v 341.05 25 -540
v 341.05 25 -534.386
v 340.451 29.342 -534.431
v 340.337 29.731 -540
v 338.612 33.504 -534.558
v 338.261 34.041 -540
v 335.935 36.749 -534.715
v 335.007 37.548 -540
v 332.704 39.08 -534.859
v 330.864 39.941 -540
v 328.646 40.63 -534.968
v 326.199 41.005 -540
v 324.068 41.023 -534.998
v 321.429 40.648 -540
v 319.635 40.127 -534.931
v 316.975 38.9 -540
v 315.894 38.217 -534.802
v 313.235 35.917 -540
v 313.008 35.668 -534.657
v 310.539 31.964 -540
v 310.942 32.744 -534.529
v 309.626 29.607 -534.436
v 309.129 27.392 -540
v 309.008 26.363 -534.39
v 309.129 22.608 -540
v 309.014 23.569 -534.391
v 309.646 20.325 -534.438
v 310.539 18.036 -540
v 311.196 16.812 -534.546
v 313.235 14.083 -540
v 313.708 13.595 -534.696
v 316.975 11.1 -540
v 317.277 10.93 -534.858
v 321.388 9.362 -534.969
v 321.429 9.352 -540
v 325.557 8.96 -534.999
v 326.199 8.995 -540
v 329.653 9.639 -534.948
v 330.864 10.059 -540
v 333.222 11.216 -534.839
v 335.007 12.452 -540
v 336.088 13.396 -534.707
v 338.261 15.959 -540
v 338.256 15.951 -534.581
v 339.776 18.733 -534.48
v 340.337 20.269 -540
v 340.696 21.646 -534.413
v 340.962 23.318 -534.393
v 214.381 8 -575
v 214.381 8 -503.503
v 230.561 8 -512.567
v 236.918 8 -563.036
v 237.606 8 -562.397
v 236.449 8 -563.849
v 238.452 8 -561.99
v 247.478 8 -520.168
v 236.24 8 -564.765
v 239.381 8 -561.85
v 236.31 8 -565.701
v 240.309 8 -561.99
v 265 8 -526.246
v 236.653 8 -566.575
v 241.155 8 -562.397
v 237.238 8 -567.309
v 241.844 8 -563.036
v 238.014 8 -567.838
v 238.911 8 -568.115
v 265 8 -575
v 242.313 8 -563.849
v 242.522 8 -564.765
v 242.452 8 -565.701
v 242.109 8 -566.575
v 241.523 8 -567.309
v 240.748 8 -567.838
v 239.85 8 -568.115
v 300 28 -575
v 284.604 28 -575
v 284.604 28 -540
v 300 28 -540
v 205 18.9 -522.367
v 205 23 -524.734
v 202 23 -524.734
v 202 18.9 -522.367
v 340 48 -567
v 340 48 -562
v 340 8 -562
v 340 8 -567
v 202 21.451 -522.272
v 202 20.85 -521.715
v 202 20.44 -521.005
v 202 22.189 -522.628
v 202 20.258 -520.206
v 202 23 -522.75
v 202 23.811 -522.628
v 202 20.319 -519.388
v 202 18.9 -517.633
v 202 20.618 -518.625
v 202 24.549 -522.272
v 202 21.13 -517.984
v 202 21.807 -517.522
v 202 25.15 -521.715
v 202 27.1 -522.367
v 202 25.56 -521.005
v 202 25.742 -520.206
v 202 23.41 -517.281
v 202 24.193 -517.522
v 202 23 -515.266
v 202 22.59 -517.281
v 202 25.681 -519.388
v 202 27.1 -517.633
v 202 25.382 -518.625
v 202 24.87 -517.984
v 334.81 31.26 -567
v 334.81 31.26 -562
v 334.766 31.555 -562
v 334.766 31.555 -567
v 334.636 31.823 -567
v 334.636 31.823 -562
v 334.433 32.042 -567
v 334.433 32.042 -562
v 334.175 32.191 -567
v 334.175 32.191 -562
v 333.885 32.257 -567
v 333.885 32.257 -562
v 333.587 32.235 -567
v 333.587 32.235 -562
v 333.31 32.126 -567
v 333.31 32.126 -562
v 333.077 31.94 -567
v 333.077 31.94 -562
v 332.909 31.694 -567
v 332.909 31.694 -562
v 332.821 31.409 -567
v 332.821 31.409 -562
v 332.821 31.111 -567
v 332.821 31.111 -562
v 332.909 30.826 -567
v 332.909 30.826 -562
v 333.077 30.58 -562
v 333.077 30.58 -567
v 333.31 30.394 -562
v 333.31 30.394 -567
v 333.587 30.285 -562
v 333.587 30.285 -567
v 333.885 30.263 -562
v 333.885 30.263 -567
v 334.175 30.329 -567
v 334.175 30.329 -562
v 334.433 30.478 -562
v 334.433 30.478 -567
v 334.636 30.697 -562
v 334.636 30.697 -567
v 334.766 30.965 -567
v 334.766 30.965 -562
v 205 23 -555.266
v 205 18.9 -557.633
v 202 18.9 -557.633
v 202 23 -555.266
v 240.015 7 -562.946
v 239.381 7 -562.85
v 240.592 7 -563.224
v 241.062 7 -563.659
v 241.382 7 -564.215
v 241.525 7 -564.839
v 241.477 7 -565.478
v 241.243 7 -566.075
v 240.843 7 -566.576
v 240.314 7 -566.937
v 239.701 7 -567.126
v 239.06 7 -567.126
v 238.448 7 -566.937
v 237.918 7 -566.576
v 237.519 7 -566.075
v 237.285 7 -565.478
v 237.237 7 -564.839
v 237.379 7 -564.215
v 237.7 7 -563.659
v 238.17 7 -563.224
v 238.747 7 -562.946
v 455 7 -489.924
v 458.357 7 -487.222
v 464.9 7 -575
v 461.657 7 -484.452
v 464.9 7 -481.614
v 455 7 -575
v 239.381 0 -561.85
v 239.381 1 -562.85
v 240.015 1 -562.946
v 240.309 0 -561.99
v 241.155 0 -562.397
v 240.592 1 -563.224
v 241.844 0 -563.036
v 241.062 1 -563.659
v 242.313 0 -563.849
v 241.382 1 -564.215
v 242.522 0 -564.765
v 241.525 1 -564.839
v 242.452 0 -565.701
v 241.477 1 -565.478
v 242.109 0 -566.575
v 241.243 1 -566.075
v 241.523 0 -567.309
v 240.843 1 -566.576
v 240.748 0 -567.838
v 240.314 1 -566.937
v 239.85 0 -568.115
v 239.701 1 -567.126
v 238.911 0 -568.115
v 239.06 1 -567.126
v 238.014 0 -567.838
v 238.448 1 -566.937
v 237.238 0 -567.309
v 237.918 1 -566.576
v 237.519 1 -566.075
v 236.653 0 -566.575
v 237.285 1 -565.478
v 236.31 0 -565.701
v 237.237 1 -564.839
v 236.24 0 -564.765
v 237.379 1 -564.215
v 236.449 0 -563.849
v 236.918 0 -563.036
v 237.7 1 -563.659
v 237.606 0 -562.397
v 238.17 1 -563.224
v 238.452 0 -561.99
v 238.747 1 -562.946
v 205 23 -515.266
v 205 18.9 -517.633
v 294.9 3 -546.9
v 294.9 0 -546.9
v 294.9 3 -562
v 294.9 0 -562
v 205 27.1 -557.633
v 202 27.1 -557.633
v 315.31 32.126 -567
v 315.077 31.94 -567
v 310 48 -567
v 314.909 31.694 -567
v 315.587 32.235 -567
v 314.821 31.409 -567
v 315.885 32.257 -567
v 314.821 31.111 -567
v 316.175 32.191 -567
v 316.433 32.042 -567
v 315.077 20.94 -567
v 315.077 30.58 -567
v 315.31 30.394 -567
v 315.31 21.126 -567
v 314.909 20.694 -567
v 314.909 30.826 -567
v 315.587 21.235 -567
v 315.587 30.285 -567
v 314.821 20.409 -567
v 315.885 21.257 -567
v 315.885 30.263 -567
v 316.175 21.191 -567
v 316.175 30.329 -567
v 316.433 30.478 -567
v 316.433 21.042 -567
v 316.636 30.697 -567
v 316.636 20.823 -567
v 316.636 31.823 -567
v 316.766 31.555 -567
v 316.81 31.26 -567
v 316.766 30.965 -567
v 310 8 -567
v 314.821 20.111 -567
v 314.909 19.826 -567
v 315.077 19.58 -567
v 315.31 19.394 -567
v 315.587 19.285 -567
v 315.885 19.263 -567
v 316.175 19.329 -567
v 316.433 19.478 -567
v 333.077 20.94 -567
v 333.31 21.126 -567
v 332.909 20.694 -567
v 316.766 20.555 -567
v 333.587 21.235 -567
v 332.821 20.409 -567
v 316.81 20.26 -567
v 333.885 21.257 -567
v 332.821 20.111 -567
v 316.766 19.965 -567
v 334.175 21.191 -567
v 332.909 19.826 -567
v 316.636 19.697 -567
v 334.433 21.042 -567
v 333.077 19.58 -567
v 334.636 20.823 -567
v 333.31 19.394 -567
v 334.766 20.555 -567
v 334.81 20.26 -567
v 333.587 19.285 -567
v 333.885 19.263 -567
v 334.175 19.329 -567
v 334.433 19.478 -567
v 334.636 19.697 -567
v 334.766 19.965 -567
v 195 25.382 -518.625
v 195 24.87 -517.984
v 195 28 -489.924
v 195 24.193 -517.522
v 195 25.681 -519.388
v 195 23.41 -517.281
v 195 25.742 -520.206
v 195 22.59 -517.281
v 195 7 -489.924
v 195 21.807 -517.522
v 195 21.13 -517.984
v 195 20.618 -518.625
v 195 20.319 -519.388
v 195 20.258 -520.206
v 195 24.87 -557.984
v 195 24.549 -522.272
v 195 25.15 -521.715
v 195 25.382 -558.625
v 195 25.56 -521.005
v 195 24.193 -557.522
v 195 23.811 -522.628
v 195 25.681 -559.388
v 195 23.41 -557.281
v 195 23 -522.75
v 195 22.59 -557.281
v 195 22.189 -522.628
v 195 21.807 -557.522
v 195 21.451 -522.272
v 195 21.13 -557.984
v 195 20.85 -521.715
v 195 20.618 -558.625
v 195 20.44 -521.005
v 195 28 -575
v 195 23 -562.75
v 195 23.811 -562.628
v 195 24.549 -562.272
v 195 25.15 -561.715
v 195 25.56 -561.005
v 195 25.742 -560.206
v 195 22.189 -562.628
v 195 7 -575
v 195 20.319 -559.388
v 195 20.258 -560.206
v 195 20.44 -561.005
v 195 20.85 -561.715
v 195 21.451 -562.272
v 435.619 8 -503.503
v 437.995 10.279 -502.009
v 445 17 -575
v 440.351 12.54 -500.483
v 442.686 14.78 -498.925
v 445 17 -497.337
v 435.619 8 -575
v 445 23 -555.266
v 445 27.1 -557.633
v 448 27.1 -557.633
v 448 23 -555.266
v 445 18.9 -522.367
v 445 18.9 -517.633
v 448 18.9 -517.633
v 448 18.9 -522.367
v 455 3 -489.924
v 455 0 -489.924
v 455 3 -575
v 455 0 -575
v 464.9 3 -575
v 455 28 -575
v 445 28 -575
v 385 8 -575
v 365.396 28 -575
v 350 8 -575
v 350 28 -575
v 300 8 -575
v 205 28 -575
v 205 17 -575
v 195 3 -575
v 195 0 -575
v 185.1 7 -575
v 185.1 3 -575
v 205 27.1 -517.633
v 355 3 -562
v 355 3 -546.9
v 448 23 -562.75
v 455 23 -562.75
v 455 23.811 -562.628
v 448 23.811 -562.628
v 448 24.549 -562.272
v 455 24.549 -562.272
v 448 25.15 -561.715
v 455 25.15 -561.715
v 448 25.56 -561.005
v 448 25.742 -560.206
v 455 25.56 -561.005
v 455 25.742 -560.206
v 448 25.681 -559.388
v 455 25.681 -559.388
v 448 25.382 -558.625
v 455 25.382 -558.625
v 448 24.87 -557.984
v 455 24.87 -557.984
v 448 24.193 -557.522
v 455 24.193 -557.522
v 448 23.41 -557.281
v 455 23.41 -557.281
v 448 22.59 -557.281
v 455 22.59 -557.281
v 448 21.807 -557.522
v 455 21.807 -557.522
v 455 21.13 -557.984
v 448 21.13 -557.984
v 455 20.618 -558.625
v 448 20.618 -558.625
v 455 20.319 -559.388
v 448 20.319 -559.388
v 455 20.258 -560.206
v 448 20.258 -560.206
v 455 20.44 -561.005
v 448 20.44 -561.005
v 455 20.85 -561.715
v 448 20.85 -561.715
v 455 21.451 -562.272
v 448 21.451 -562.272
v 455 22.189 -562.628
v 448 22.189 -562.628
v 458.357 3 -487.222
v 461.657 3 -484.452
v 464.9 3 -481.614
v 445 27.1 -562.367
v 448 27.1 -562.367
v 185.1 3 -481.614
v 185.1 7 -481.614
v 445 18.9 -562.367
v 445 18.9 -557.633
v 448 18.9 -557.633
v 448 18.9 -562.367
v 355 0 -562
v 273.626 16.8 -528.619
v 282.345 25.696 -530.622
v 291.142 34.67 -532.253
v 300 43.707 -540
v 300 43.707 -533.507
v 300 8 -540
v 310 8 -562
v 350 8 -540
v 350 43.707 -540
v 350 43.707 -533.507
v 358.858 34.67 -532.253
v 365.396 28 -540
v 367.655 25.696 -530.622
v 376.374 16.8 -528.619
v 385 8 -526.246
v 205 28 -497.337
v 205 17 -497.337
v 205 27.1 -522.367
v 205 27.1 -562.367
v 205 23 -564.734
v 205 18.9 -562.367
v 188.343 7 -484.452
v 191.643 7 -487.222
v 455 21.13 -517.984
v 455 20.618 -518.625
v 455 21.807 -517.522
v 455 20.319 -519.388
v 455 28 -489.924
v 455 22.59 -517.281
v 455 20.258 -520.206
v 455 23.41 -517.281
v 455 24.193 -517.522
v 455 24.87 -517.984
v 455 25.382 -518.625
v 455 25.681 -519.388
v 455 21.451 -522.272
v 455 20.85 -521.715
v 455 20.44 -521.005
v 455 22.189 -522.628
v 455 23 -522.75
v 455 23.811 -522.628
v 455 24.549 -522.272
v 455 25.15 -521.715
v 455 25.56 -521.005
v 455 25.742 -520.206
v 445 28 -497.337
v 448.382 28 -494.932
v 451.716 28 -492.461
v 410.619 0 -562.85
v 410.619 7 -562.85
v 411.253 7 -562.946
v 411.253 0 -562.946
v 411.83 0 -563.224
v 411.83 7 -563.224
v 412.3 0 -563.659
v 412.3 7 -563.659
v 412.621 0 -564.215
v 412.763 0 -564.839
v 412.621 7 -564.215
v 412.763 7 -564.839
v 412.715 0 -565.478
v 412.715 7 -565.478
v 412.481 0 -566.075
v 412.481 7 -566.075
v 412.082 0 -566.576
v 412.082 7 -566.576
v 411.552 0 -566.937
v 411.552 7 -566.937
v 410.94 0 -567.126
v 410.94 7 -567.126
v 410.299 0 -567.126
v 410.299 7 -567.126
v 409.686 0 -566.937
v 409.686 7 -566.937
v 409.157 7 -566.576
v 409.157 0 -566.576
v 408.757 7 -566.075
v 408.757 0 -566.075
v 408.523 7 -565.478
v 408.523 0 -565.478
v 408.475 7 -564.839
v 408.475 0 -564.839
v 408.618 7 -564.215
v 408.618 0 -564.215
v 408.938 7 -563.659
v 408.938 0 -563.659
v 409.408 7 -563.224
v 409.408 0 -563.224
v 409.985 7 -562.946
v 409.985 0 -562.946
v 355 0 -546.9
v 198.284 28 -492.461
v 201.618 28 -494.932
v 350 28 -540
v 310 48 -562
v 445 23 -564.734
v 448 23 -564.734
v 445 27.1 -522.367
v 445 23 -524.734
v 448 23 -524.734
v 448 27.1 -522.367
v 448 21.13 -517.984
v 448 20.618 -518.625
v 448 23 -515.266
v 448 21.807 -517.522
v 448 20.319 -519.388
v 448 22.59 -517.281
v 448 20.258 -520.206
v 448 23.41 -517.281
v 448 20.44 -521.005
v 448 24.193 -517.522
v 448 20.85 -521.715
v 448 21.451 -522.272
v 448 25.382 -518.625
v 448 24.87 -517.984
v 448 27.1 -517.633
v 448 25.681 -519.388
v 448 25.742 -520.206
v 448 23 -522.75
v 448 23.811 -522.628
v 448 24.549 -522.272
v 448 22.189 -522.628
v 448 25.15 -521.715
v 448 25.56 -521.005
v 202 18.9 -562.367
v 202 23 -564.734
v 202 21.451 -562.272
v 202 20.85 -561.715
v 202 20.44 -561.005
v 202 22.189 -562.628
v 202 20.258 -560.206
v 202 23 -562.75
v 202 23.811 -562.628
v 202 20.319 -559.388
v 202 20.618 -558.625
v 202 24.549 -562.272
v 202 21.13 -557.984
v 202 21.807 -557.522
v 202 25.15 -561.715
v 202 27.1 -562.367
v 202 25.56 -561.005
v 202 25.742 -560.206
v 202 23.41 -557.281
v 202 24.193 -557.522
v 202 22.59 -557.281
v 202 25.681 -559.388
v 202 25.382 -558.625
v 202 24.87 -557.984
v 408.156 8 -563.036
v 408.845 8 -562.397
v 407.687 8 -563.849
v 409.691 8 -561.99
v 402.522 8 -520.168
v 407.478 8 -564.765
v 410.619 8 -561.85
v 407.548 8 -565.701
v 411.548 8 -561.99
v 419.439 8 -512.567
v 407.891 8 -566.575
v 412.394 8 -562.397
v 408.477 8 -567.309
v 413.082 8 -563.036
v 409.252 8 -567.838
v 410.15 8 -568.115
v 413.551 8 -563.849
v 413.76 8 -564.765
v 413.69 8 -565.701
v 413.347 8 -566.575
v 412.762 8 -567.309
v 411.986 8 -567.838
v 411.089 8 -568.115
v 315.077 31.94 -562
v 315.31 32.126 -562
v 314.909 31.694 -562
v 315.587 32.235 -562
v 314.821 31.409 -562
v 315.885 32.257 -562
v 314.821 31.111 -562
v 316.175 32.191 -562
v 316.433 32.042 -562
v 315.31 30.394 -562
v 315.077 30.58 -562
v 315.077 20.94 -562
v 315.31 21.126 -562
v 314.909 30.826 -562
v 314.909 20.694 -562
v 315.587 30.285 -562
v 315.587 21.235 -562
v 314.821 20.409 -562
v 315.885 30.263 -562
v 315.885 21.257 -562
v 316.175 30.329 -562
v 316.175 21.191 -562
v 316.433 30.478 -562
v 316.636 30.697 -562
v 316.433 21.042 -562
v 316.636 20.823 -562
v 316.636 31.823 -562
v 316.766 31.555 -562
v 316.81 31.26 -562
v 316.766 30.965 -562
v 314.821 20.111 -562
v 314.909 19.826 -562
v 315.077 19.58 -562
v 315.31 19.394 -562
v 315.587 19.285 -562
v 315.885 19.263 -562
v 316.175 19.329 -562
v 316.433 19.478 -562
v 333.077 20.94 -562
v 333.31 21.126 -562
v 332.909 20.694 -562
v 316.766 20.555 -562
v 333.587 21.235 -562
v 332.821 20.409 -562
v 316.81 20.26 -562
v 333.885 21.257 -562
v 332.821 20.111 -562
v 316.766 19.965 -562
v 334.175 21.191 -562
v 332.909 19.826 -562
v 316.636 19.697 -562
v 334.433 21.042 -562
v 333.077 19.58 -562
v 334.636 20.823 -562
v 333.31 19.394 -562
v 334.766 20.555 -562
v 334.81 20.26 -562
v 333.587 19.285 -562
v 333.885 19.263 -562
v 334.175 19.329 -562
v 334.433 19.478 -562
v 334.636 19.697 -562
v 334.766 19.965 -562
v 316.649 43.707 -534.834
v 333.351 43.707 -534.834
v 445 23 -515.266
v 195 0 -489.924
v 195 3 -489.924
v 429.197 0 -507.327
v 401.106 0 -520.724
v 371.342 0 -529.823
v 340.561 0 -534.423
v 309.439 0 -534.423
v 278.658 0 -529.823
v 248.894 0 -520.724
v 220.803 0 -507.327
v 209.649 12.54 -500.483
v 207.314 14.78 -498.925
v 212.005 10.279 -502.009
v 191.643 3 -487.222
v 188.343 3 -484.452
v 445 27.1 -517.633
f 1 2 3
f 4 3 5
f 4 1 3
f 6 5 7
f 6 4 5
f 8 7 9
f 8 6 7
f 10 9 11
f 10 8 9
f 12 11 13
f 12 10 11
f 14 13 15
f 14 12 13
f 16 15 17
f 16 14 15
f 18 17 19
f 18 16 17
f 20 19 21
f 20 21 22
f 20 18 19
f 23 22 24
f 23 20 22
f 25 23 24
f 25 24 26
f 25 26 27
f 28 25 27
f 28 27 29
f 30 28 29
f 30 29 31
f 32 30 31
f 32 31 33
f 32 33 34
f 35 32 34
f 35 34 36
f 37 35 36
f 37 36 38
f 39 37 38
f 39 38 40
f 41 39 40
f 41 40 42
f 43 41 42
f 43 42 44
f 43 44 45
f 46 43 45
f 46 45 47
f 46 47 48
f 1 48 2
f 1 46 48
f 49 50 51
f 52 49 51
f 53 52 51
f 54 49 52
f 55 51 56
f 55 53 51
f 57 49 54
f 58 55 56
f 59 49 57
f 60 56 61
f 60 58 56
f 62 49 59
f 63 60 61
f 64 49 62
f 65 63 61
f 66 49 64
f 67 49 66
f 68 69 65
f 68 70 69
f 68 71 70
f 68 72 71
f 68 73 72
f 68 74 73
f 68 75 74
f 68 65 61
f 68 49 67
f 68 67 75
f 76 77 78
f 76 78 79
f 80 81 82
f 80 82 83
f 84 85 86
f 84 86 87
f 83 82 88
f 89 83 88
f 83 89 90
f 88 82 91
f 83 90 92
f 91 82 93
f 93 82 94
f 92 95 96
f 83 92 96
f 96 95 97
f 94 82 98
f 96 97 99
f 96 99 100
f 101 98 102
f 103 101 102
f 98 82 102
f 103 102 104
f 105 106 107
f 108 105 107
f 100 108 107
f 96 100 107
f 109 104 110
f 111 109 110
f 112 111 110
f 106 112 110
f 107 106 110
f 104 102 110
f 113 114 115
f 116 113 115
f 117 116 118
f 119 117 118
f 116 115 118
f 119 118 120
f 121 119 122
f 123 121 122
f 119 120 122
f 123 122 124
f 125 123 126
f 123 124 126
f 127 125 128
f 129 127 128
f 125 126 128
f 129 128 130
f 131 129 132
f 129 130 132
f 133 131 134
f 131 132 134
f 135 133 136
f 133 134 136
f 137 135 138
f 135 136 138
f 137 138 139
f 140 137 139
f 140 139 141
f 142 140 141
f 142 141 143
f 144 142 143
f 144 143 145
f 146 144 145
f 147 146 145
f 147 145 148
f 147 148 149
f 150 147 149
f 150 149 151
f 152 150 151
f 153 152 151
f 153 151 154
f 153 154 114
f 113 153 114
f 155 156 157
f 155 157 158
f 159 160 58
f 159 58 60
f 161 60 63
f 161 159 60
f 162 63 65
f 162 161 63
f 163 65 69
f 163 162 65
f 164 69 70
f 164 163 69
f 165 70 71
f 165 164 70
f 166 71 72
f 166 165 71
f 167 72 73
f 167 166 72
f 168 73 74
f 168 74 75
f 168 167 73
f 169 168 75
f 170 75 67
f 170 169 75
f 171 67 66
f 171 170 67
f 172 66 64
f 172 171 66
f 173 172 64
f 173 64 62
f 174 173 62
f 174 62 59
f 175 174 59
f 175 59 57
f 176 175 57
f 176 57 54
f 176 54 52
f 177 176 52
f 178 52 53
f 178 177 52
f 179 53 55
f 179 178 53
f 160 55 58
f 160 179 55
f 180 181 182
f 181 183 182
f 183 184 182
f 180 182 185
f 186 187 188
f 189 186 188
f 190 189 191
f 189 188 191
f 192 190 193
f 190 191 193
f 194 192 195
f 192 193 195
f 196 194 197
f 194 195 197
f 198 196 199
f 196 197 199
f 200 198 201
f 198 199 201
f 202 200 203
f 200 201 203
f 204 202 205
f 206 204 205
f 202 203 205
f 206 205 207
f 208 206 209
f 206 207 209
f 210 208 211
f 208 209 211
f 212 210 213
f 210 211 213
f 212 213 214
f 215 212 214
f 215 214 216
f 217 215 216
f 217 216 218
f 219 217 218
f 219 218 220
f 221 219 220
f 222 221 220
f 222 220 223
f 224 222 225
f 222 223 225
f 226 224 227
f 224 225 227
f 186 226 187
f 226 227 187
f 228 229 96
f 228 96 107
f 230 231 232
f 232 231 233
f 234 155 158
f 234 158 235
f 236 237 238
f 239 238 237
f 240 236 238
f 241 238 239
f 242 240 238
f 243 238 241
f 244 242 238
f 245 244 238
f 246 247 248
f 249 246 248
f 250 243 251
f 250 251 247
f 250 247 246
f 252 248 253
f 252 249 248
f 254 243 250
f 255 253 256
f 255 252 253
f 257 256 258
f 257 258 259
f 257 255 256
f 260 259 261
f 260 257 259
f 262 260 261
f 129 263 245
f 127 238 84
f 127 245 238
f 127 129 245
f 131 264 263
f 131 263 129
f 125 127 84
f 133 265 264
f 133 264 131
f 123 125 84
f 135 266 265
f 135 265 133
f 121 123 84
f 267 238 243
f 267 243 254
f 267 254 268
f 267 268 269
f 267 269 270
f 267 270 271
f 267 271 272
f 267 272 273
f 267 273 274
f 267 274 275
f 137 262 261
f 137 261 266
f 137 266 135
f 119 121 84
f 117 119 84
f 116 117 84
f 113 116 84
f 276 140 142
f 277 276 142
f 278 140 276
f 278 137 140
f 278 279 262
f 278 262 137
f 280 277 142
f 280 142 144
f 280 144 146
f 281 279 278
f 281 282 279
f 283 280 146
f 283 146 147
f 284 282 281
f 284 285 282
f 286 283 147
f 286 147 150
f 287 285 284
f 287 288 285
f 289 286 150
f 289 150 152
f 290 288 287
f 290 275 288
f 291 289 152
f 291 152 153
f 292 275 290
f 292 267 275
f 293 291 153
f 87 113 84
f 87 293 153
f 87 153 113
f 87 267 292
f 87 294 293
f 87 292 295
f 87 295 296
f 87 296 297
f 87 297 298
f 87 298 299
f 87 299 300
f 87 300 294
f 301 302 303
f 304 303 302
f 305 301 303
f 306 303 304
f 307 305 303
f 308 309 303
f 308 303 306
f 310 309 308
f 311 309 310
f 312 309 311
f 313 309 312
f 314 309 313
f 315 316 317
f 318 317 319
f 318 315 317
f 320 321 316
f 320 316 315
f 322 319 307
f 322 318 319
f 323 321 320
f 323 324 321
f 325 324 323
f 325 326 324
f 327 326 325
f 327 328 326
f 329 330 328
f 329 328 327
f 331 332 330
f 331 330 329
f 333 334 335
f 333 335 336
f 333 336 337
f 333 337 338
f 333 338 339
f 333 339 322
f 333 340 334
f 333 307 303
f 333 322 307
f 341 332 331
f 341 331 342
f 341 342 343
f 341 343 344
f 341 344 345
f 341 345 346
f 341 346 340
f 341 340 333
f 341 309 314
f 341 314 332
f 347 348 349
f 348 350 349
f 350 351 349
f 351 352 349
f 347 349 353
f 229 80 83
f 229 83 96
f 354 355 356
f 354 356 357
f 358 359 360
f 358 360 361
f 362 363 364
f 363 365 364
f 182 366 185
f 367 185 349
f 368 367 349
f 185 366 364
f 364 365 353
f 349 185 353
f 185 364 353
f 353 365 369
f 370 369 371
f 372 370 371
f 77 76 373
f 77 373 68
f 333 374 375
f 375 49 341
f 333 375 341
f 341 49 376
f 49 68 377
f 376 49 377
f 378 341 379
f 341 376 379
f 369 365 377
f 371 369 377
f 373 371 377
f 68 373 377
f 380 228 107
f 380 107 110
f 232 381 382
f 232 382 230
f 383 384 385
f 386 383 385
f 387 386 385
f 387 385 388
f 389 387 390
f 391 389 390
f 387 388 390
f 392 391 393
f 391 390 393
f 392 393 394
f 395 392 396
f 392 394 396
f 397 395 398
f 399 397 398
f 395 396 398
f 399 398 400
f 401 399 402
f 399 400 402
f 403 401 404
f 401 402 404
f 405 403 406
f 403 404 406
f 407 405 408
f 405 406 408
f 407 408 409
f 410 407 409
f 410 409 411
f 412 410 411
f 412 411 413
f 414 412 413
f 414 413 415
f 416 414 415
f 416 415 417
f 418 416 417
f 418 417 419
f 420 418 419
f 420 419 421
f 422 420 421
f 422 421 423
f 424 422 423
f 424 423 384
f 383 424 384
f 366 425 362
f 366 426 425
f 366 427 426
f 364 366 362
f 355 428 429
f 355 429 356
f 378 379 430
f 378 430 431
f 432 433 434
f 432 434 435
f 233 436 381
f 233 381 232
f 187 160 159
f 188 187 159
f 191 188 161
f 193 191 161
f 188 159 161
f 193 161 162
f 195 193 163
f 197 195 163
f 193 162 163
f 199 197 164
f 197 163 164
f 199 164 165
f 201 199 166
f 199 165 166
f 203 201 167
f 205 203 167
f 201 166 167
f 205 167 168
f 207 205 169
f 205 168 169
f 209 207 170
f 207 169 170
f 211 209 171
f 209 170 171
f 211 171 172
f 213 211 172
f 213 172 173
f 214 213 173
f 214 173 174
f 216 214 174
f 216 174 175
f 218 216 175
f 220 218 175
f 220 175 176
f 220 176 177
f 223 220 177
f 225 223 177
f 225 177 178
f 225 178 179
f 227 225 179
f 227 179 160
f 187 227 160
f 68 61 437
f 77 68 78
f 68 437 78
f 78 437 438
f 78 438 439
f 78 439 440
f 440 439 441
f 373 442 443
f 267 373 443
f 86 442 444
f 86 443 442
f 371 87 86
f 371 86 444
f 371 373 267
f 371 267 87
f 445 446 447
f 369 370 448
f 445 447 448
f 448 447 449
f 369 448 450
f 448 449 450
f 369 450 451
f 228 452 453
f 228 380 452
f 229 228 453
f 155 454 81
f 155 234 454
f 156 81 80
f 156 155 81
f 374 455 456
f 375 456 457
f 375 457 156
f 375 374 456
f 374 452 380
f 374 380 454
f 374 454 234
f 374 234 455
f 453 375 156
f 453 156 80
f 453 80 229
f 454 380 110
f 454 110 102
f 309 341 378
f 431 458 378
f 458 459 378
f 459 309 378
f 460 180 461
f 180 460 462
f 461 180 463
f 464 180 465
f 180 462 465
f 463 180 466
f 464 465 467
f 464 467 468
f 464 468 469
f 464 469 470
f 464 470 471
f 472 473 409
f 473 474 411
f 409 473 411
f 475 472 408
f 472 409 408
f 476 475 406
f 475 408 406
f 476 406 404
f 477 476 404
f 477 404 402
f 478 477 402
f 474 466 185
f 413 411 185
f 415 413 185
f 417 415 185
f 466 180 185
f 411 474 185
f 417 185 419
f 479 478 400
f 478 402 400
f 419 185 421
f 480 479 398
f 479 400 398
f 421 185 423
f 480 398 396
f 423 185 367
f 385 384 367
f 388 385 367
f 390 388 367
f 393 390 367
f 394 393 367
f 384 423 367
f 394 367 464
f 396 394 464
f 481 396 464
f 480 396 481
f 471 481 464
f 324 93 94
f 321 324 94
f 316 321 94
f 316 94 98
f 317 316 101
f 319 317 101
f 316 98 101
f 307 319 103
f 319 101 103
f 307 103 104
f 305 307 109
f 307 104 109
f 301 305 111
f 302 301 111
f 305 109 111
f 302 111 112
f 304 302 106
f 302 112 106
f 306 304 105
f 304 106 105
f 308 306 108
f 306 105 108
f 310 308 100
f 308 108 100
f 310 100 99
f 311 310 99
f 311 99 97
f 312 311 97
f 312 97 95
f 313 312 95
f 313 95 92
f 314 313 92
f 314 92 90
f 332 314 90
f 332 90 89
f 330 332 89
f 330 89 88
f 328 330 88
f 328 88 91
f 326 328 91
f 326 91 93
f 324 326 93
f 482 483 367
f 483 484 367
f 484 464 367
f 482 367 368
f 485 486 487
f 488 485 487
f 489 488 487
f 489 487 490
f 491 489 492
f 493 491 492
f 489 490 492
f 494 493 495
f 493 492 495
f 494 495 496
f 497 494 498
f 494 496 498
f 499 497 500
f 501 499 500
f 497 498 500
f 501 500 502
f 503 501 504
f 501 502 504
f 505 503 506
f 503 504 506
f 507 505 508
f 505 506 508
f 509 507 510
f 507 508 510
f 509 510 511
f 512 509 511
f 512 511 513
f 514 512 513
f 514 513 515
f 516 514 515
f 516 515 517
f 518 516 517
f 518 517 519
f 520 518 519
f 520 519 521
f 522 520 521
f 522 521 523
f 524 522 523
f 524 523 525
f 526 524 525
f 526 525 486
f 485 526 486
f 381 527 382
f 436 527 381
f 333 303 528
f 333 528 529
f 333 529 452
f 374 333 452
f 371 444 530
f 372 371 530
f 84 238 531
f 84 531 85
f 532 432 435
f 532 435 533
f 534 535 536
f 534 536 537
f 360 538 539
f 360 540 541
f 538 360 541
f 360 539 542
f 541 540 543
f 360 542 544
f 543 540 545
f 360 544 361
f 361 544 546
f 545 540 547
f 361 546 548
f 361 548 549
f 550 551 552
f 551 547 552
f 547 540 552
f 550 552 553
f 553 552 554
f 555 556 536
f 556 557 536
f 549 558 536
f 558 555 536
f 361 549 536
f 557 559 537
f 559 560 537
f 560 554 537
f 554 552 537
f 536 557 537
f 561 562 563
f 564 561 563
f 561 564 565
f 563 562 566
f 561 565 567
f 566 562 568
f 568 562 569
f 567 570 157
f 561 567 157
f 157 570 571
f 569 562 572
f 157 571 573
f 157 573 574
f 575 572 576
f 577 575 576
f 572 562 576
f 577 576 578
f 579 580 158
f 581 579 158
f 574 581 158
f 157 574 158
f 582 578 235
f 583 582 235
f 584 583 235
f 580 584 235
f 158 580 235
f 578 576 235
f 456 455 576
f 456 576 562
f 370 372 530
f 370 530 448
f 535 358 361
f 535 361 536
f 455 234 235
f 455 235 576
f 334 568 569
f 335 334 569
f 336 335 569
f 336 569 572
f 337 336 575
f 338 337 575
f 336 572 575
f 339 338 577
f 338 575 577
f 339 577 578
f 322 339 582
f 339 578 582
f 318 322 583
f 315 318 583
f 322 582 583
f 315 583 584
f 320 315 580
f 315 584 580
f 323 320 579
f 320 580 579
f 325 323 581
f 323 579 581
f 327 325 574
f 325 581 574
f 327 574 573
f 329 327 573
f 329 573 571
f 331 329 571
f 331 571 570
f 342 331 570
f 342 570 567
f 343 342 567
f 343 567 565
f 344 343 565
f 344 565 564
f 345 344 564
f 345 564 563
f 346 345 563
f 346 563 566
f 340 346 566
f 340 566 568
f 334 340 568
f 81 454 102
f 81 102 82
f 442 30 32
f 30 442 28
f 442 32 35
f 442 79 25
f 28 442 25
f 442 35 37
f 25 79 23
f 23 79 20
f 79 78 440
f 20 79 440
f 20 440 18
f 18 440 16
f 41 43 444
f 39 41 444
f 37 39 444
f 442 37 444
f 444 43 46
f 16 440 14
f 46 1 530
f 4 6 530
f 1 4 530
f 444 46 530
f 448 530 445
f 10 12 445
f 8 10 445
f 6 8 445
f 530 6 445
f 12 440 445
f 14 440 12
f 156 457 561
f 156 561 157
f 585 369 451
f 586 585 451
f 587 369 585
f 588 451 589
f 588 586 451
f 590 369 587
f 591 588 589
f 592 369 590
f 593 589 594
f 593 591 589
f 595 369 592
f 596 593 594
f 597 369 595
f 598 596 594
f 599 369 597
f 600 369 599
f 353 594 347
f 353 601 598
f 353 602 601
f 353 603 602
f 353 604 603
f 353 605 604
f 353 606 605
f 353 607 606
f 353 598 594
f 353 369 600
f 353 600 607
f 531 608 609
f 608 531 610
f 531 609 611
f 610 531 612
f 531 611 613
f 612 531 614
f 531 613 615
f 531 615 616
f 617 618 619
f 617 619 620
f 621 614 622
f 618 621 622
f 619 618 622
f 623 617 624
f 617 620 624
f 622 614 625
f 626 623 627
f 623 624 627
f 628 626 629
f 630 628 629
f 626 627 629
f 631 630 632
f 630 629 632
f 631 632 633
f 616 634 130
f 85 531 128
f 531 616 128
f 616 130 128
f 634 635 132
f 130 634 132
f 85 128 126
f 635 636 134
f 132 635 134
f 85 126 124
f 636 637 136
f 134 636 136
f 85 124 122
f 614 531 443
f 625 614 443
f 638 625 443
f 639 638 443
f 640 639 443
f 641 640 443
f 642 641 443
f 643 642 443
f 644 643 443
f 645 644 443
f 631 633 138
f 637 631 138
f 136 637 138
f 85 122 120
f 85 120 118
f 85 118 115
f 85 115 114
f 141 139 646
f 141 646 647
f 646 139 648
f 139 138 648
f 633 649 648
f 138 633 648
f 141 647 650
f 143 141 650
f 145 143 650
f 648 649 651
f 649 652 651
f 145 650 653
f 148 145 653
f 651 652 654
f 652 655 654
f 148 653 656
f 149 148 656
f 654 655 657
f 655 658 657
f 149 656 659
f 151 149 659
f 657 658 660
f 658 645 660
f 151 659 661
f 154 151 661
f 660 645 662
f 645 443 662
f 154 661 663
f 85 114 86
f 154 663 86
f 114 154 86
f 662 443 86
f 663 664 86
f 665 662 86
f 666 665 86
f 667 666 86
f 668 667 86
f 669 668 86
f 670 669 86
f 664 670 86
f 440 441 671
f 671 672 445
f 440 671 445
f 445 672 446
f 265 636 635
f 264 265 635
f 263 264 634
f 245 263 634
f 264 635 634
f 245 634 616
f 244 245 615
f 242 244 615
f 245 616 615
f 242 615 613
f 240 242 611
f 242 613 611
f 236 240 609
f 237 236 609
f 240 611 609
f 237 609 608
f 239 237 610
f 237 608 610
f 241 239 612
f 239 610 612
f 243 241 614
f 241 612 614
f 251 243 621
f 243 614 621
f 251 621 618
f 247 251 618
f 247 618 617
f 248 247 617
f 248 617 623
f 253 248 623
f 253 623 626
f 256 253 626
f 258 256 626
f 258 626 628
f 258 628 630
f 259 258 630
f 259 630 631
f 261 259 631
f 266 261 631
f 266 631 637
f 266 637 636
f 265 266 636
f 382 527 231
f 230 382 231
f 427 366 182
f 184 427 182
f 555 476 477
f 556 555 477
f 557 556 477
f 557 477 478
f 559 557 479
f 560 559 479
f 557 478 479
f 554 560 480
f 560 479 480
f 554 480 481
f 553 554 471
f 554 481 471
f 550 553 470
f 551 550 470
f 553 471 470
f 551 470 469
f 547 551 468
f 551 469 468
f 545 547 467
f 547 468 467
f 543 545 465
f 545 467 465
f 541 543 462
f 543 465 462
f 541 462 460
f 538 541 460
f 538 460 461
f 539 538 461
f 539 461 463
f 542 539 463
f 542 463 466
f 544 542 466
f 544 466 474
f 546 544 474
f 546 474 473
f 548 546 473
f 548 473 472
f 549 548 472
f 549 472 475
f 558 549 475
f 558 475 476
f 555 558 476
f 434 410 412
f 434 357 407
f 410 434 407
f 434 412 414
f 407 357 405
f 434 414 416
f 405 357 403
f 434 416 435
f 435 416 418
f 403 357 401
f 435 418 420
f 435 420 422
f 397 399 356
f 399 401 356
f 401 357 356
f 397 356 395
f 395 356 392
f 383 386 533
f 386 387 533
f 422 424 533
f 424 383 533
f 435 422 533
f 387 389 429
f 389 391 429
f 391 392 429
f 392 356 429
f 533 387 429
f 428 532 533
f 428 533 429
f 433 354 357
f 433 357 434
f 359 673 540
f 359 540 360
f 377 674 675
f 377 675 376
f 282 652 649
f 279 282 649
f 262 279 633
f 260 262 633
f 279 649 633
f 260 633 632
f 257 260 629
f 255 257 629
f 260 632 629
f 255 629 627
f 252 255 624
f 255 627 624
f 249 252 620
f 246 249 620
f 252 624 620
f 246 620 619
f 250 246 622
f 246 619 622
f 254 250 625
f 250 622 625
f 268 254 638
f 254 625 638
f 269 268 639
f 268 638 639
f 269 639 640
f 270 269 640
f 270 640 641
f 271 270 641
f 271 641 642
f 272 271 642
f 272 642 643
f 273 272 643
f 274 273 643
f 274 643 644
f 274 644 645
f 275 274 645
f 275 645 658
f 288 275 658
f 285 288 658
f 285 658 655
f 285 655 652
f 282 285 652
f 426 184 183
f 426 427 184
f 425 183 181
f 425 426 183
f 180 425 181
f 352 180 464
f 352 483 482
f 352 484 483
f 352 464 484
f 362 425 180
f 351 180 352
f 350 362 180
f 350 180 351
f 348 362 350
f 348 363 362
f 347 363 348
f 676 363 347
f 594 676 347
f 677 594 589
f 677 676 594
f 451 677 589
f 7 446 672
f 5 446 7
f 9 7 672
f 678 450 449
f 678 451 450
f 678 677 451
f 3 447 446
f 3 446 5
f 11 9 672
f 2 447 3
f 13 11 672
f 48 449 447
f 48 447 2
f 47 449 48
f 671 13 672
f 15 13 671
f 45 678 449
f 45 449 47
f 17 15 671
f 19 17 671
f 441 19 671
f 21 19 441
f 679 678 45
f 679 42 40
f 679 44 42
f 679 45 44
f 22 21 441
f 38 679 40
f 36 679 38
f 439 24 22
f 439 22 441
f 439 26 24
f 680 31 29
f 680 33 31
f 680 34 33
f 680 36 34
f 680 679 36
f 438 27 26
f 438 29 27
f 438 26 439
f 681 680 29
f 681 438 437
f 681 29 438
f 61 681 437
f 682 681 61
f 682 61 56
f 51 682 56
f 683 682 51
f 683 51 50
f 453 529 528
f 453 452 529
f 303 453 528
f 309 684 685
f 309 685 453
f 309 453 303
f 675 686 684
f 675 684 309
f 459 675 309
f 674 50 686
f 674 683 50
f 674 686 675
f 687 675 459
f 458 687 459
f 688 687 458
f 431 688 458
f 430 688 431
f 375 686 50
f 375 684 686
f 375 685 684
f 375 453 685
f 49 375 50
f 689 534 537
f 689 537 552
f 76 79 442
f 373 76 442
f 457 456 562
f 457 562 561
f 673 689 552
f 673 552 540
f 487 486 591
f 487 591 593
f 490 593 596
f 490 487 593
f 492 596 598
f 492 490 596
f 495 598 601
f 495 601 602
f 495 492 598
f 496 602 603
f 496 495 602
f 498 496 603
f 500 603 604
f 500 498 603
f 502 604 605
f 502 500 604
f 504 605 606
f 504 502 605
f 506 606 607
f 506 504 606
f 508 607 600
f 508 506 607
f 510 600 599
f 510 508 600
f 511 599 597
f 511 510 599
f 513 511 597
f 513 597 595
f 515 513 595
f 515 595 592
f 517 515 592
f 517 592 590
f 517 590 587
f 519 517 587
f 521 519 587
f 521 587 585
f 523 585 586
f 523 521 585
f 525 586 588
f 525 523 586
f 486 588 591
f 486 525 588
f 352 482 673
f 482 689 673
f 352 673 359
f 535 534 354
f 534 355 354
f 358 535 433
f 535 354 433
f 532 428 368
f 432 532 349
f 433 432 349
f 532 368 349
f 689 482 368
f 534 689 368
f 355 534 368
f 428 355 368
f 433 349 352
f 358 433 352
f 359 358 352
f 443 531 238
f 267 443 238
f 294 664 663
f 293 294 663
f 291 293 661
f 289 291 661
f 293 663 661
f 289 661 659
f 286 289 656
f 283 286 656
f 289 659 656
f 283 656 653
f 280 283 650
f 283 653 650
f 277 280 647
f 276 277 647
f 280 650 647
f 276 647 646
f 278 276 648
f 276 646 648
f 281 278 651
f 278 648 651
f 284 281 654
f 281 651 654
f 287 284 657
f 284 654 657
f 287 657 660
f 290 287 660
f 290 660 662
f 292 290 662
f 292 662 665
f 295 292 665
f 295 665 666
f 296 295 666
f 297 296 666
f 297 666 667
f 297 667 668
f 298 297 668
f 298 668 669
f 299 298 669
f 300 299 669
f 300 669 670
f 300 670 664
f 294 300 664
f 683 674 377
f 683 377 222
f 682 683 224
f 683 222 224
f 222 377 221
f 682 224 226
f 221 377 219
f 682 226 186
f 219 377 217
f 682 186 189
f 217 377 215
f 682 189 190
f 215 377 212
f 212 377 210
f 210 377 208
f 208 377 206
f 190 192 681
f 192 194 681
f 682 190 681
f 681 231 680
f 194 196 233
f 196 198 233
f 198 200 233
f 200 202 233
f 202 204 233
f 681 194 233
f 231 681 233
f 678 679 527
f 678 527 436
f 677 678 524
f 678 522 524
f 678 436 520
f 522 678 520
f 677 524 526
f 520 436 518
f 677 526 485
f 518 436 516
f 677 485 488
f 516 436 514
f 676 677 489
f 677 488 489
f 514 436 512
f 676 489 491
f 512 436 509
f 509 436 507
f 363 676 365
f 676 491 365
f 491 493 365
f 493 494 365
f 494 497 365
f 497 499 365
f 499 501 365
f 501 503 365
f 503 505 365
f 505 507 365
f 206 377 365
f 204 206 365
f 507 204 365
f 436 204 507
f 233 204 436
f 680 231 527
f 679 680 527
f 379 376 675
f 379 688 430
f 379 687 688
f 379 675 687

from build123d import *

# Parameters (mm, degrees)
SKETCH1_W               = 650
SKETCH1_H               = 650
BOSS_EXTRUDE1_DEPTH     = 8
BOSS_EXTRUDE2_DEPTH     = 650
CUT_EXTRUDE2_DEPTH      = 921.277302922
CUT_EXTRUDE2_DEPTH_BACK = 921.277302922
SKETCH4_R               = 16.05
CUT_EXTRUDE1_DEPTH      = 920.932062709
CUT_EXTRUDE1_DEPTH_BACK = 920.932062709
SKETCH2_R               = 210
CUT_EXTRUDE3_DEPTH      = 921.277302998
CUT_EXTRUDE3_DEPTH_BACK = 110
CUT_EXTRUDE4_DEPTH      = 110
CUT_EXTRUDE5_DEPTH      = 920.932062713
CUT_EXTRUDE5_DEPTH_BACK = 920.932062713
SKETCH7_OUTSIDE_W       = 836.056
SKETCH7_OUTSIDE_H       = 836.056
SKETCH7_OUTSIDE_W_2     = 260
SKETCH7_OUTSIDE_H_2     = 231.544504505
BOSS_EXTRUDE3_DEPTH     = 170
SKETCH9_W               = 9.9
SKETCH9_H               = 4
BOSS_EXTRUDE4_DEPTH     = 170
CUT_EXTRUDE6_DEPTH      = 800.941879143
CUT_EXTRUDE6_DEPTH_BACK = 800.941879143
SKETCH10_R              = 210
SKETCH11_W              = 30
SKETCH11_H              = 5
BOSS_EXTRUDE5_DEPTH     = 40
CUT_EXTRUDE7_DEPTH      = 801.144993169
CUT_EXTRUDE7_DEPTH_BACK = 801.144993169
SKETCH13_R              = 2.75
CUT_EXTRUDE8_DEPTH      = 10
SKETCH14_R              = 2.75
CUT_EXTRUDE9_DEPTH      = 10
CUT_EXTRUDE10_DEPTH     = 3
LPATTERN1_COUNT         = 2
LPATTERN1_PITCH         = 40
CUT_EXTRUDE11_DEPTH     = 3
LPATTERN2_COUNT         = 2
LPATTERN2_PITCH         = 40
SKETCH17_R              = 2.15
CUT_EXTRUDE12_DEPTH     = 10
CHAMFER1_SIZE           = 1
SKETCH18_W              = 60.1
SKETCH18_H              = 15.1
CUT_EXTRUDE13_DEPTH     = 3
SKETCH19_R              = 1
CUT_EXTRUDE14_DEPTH     = 10


with BuildPart() as part:
    # Sketch1 → Boss-Extrude1 (new body)
    with BuildSketch(Plane(origin=(0, 0, 0), x_dir=(1, 0, 0), z_dir=(0, 1, 0))):
        with Locations((325, 325)):
            Rectangle(SKETCH1_W, SKETCH1_H)
    extrude(amount=BOSS_EXTRUDE1_DEPTH)

    # Sketch3 → Boss-Extrude2 (add)
    with BuildSketch(Plane.XY):
        Polygon((300, 43.707142143), (350, 43.707142143), (385, 8), (265, 8), align=None)
    extrude(amount=-BOSS_EXTRUDE2_DEPTH)

    # Sketch4 → Cut-Extrude2 (cut, two sides: drawn at the far end of the back side and taken through both)
    with BuildSketch(Plane.XY.offset(-CUT_EXTRUDE2_DEPTH_BACK)):
        with Locations((325, 25)):
            Circle(SKETCH4_R)
    extrude(amount=CUT_EXTRUDE2_DEPTH + CUT_EXTRUDE2_DEPTH_BACK, mode=Mode.SUBTRACT)

    # Sketch2 → Cut-Extrude1 (cut, two sides: drawn at the far end of the back side and taken through both)
    with BuildSketch(Plane(origin=(0, 8, 0), x_dir=(1, 0, 0), z_dir=(0, 1, 0)).offset(-CUT_EXTRUDE1_DEPTH_BACK)):
        with Locations(Location((325, 325, 0), (0, 0, 270))):
            Circle(SKETCH2_R)
    extrude(amount=CUT_EXTRUDE1_DEPTH + CUT_EXTRUDE1_DEPTH_BACK, mode=Mode.SUBTRACT)

    # Sketch5 → Cut-Extrude3 (cut, two sides: drawn at the far end of the back side and taken through both)
    with BuildSketch(Plane.XY.offset(-CUT_EXTRUDE3_DEPTH_BACK)):
        Polygon((300, 43.707142143), (350, 43.707142143), (365.396078824, 28), (350, 28), (350, 8), (300, 8), (300, 28), (284.603921176, 28), align=None)
    extrude(amount=CUT_EXTRUDE3_DEPTH + CUT_EXTRUDE3_DEPTH_BACK, mode=Mode.SUBTRACT)

    # Sketch6 → Cut-Extrude4 (cut)
    with BuildSketch(Plane(origin=(0, 0, -650), x_dir=(-1, 0, 0), z_dir=(0, 0, -1))):
        Polygon((-350, 43.707142143), (-300, 43.707142143), (-284.603921176, 28), (-300, 28), (-300, 8), (-350, 8), (-350, 28), (-365.396078824, 28), align=None)
    extrude(amount=-CUT_EXTRUDE4_DEPTH, mode=Mode.SUBTRACT)

    # Sketch7 outside → Cut-Extrude5 (cut, two sides: drawn at the far end of the back side and taken through both)
    with BuildSketch(Plane(origin=(0, 8, 0), x_dir=(1, 0, 0), z_dir=(0, 1, 0)).offset(-CUT_EXTRUDE5_DEPTH_BACK)):
        with Locations((325, 325)):
            Rectangle(SKETCH7_OUTSIDE_W, SKETCH7_OUTSIDE_H)
        with Locations((325, 570.772252253)):
            Rectangle(SKETCH7_OUTSIDE_W_2, SKETCH7_OUTSIDE_H_2, mode=Mode.SUBTRACT)
    extrude(amount=CUT_EXTRUDE5_DEPTH + CUT_EXTRUDE5_DEPTH_BACK, mode=Mode.SUBTRACT)

    # Sketch8 → Boss-Extrude3 (add)
    with BuildSketch(Plane(origin=(0, 0, -650), x_dir=(-1, 0, 0), z_dir=(0, 0, -1))):
        Polygon((-455, 8), (-455, 28), (-445, 28), (-445, 17), (-435.61916848, 8), align=None)
        Polygon((-195, 8), (-195, 28), (-205, 28), (-205, 17), (-214.38083152, 8), align=None)
    extrude(amount=-BOSS_EXTRUDE3_DEPTH)

    # Sketch9 → Boss-Extrude4 (add)
    with BuildSketch(Plane(origin=(0, 0, -650), x_dir=(-1, 0, 0), z_dir=(0, 0, -1))):
        with Locations((-459.95, 5)):
            Rectangle(SKETCH9_W, SKETCH9_H)
        with Locations((-190.05, 5)):
            Rectangle(SKETCH9_W, SKETCH9_H)
    extrude(amount=-BOSS_EXTRUDE4_DEPTH)

    # Sketch10 → Cut-Extrude6 (cut, two sides: drawn at the far end of the back side and taken through both)
    with BuildSketch(Plane(origin=(0, 8, 0), x_dir=(1, 0, 0), z_dir=(0, 1, 0)).offset(-CUT_EXTRUDE6_DEPTH_BACK)):
        with Locations((325, 325)):
            Circle(SKETCH10_R)
    extrude(amount=CUT_EXTRUDE6_DEPTH + CUT_EXTRUDE6_DEPTH_BACK, mode=Mode.SUBTRACT)

    # Sketch11 → Boss-Extrude5 (add)
    with BuildSketch(Plane(origin=(0, 8, 0), x_dir=(1, 0, 0), z_dir=(0, 1, 0))):
        with Locations((325, 564.5)):
            Rectangle(SKETCH11_W, SKETCH11_H)
    extrude(amount=BOSS_EXTRUDE5_DEPTH)

    # Sketch12 → Cut-Extrude7 (cut, two sides: drawn at the far end of the back side and taken through both)
    with BuildSketch(Plane(origin=(0, 8, 0), x_dir=(1, 0, 0), z_dir=(0, 1, 0)).offset(-CUT_EXTRUDE7_DEPTH_BACK)):
        Polygon((325, 650), (468.244620066, 650), (468.244620066, 575), (178.69132389, 575), (178.69132389, 650), align=None)
    extrude(amount=CUT_EXTRUDE7_DEPTH + CUT_EXTRUDE7_DEPTH_BACK, mode=Mode.SUBTRACT)

    # Sketch13 → Cut-Extrude8 (cut)
    with BuildSketch(Plane(origin=(205, 0, 0), x_dir=(0, 0, -1), z_dir=(1, 0, 0))):
        with Locations((520, 23)):
            Circle(SKETCH13_R)
        with Locations((560, 23)):
            Circle(SKETCH13_R)
    extrude(amount=-CUT_EXTRUDE8_DEPTH, mode=Mode.SUBTRACT)

    # Sketch14 → Cut-Extrude9 (cut)
    with BuildSketch(Plane(origin=(455, 0, 0), x_dir=(0, 0, -1), z_dir=(1, 0, 0))):
        with Locations((560, 23)):
            Circle(SKETCH14_R)
        with Locations((520, 23)):
            Circle(SKETCH14_R)
    extrude(amount=-CUT_EXTRUDE9_DEPTH, mode=Mode.SUBTRACT)

    # Sketch15 → Cut-Extrude10 (cut)
    with BuildSketch(Plane(origin=(205, 0, 0), x_dir=(0, 0, -1), z_dir=(1, 0, 0))):
        Polygon((557.632863896, 27.1), (562.367136104, 27.1), (564.734272207, 23), (562.367136104, 18.9), (557.632863896, 18.9), (555.265727793, 23), align=None)
    cut_extrude10 = extrude(amount=-CUT_EXTRUDE10_DEPTH, mode=Mode.SUBTRACT)

    # LPattern1: Cut-Extrude10 ×2
    with Locations(*[(0, 0, i * LPATTERN1_PITCH) for i in range(1, LPATTERN1_COUNT)]):
        add(cut_extrude10, mode=Mode.SUBTRACT)

    # Sketch16 → Cut-Extrude11 (cut)
    with BuildSketch(Plane.ZY.offset(-445)):
        Polygon((-522.367136104, 27.1), (-517.632863896, 27.1), (-515.265727793, 23), (-517.632863896, 18.9), (-522.367136104, 18.9), (-524.734272207, 23), align=None)
    cut_extrude11 = extrude(amount=-CUT_EXTRUDE11_DEPTH, mode=Mode.SUBTRACT)

    # LPattern2: Cut-Extrude11 ×2
    with Locations(*[(0, 0, -i * LPATTERN2_PITCH) for i in range(1, LPATTERN2_COUNT)]):
        add(cut_extrude11, mode=Mode.SUBTRACT)

    # Sketch17 → Cut-Extrude12 (cut)
    with BuildSketch(Plane(origin=(0, 8, 0), x_dir=(1, 0, 0), z_dir=(0, 1, 0))):
        with Locations(Location((239.38083152, 565, 0), (0, 0, 270))):
            Circle(SKETCH17_R)
        with Locations(Location((410.61916848, 565, 0), (0, 0, 270))):
            Circle(SKETCH17_R)
    extrude(amount=-CUT_EXTRUDE12_DEPTH, mode=Mode.SUBTRACT)

    # Chamfer1
    chamfer1_edges = [part.edges().sort_by_distance(p)[0] for p in [
        (239.38083152, 0, -567.15),
        (239.38083152, 8, -567.15),
        (410.61916848, 8, -567.15),
    ]]
    chamfer(chamfer1_edges, length=CHAMFER1_SIZE)

    # Sketch18 → Cut-Extrude13 (cut)
    with BuildSketch(Plane(origin=(0, 0, 0), x_dir=(-1, 0, 0), z_dir=(0, -1, 0))):
        with Locations((-324.95, 554.45)):
            Rectangle(SKETCH18_W, SKETCH18_H)
    extrude(amount=-CUT_EXTRUDE13_DEPTH, mode=Mode.SUBTRACT)

    # Sketch19 → Cut-Extrude14 (cut)
    with BuildSketch(Plane.XY.offset(-562)):
        with Locations((315.81, 20.26)):
            Circle(SKETCH19_R)
        with Locations((333.81, 20.26)):
            Circle(SKETCH19_R)
        with Locations((333.81, 31.26)):
            Circle(SKETCH19_R)
        with Locations((315.81, 31.26)):
            Circle(SKETCH19_R)
    extrude(amount=-CUT_EXTRUDE14_DEPTH, mode=Mode.SUBTRACT)


solid = part.part
